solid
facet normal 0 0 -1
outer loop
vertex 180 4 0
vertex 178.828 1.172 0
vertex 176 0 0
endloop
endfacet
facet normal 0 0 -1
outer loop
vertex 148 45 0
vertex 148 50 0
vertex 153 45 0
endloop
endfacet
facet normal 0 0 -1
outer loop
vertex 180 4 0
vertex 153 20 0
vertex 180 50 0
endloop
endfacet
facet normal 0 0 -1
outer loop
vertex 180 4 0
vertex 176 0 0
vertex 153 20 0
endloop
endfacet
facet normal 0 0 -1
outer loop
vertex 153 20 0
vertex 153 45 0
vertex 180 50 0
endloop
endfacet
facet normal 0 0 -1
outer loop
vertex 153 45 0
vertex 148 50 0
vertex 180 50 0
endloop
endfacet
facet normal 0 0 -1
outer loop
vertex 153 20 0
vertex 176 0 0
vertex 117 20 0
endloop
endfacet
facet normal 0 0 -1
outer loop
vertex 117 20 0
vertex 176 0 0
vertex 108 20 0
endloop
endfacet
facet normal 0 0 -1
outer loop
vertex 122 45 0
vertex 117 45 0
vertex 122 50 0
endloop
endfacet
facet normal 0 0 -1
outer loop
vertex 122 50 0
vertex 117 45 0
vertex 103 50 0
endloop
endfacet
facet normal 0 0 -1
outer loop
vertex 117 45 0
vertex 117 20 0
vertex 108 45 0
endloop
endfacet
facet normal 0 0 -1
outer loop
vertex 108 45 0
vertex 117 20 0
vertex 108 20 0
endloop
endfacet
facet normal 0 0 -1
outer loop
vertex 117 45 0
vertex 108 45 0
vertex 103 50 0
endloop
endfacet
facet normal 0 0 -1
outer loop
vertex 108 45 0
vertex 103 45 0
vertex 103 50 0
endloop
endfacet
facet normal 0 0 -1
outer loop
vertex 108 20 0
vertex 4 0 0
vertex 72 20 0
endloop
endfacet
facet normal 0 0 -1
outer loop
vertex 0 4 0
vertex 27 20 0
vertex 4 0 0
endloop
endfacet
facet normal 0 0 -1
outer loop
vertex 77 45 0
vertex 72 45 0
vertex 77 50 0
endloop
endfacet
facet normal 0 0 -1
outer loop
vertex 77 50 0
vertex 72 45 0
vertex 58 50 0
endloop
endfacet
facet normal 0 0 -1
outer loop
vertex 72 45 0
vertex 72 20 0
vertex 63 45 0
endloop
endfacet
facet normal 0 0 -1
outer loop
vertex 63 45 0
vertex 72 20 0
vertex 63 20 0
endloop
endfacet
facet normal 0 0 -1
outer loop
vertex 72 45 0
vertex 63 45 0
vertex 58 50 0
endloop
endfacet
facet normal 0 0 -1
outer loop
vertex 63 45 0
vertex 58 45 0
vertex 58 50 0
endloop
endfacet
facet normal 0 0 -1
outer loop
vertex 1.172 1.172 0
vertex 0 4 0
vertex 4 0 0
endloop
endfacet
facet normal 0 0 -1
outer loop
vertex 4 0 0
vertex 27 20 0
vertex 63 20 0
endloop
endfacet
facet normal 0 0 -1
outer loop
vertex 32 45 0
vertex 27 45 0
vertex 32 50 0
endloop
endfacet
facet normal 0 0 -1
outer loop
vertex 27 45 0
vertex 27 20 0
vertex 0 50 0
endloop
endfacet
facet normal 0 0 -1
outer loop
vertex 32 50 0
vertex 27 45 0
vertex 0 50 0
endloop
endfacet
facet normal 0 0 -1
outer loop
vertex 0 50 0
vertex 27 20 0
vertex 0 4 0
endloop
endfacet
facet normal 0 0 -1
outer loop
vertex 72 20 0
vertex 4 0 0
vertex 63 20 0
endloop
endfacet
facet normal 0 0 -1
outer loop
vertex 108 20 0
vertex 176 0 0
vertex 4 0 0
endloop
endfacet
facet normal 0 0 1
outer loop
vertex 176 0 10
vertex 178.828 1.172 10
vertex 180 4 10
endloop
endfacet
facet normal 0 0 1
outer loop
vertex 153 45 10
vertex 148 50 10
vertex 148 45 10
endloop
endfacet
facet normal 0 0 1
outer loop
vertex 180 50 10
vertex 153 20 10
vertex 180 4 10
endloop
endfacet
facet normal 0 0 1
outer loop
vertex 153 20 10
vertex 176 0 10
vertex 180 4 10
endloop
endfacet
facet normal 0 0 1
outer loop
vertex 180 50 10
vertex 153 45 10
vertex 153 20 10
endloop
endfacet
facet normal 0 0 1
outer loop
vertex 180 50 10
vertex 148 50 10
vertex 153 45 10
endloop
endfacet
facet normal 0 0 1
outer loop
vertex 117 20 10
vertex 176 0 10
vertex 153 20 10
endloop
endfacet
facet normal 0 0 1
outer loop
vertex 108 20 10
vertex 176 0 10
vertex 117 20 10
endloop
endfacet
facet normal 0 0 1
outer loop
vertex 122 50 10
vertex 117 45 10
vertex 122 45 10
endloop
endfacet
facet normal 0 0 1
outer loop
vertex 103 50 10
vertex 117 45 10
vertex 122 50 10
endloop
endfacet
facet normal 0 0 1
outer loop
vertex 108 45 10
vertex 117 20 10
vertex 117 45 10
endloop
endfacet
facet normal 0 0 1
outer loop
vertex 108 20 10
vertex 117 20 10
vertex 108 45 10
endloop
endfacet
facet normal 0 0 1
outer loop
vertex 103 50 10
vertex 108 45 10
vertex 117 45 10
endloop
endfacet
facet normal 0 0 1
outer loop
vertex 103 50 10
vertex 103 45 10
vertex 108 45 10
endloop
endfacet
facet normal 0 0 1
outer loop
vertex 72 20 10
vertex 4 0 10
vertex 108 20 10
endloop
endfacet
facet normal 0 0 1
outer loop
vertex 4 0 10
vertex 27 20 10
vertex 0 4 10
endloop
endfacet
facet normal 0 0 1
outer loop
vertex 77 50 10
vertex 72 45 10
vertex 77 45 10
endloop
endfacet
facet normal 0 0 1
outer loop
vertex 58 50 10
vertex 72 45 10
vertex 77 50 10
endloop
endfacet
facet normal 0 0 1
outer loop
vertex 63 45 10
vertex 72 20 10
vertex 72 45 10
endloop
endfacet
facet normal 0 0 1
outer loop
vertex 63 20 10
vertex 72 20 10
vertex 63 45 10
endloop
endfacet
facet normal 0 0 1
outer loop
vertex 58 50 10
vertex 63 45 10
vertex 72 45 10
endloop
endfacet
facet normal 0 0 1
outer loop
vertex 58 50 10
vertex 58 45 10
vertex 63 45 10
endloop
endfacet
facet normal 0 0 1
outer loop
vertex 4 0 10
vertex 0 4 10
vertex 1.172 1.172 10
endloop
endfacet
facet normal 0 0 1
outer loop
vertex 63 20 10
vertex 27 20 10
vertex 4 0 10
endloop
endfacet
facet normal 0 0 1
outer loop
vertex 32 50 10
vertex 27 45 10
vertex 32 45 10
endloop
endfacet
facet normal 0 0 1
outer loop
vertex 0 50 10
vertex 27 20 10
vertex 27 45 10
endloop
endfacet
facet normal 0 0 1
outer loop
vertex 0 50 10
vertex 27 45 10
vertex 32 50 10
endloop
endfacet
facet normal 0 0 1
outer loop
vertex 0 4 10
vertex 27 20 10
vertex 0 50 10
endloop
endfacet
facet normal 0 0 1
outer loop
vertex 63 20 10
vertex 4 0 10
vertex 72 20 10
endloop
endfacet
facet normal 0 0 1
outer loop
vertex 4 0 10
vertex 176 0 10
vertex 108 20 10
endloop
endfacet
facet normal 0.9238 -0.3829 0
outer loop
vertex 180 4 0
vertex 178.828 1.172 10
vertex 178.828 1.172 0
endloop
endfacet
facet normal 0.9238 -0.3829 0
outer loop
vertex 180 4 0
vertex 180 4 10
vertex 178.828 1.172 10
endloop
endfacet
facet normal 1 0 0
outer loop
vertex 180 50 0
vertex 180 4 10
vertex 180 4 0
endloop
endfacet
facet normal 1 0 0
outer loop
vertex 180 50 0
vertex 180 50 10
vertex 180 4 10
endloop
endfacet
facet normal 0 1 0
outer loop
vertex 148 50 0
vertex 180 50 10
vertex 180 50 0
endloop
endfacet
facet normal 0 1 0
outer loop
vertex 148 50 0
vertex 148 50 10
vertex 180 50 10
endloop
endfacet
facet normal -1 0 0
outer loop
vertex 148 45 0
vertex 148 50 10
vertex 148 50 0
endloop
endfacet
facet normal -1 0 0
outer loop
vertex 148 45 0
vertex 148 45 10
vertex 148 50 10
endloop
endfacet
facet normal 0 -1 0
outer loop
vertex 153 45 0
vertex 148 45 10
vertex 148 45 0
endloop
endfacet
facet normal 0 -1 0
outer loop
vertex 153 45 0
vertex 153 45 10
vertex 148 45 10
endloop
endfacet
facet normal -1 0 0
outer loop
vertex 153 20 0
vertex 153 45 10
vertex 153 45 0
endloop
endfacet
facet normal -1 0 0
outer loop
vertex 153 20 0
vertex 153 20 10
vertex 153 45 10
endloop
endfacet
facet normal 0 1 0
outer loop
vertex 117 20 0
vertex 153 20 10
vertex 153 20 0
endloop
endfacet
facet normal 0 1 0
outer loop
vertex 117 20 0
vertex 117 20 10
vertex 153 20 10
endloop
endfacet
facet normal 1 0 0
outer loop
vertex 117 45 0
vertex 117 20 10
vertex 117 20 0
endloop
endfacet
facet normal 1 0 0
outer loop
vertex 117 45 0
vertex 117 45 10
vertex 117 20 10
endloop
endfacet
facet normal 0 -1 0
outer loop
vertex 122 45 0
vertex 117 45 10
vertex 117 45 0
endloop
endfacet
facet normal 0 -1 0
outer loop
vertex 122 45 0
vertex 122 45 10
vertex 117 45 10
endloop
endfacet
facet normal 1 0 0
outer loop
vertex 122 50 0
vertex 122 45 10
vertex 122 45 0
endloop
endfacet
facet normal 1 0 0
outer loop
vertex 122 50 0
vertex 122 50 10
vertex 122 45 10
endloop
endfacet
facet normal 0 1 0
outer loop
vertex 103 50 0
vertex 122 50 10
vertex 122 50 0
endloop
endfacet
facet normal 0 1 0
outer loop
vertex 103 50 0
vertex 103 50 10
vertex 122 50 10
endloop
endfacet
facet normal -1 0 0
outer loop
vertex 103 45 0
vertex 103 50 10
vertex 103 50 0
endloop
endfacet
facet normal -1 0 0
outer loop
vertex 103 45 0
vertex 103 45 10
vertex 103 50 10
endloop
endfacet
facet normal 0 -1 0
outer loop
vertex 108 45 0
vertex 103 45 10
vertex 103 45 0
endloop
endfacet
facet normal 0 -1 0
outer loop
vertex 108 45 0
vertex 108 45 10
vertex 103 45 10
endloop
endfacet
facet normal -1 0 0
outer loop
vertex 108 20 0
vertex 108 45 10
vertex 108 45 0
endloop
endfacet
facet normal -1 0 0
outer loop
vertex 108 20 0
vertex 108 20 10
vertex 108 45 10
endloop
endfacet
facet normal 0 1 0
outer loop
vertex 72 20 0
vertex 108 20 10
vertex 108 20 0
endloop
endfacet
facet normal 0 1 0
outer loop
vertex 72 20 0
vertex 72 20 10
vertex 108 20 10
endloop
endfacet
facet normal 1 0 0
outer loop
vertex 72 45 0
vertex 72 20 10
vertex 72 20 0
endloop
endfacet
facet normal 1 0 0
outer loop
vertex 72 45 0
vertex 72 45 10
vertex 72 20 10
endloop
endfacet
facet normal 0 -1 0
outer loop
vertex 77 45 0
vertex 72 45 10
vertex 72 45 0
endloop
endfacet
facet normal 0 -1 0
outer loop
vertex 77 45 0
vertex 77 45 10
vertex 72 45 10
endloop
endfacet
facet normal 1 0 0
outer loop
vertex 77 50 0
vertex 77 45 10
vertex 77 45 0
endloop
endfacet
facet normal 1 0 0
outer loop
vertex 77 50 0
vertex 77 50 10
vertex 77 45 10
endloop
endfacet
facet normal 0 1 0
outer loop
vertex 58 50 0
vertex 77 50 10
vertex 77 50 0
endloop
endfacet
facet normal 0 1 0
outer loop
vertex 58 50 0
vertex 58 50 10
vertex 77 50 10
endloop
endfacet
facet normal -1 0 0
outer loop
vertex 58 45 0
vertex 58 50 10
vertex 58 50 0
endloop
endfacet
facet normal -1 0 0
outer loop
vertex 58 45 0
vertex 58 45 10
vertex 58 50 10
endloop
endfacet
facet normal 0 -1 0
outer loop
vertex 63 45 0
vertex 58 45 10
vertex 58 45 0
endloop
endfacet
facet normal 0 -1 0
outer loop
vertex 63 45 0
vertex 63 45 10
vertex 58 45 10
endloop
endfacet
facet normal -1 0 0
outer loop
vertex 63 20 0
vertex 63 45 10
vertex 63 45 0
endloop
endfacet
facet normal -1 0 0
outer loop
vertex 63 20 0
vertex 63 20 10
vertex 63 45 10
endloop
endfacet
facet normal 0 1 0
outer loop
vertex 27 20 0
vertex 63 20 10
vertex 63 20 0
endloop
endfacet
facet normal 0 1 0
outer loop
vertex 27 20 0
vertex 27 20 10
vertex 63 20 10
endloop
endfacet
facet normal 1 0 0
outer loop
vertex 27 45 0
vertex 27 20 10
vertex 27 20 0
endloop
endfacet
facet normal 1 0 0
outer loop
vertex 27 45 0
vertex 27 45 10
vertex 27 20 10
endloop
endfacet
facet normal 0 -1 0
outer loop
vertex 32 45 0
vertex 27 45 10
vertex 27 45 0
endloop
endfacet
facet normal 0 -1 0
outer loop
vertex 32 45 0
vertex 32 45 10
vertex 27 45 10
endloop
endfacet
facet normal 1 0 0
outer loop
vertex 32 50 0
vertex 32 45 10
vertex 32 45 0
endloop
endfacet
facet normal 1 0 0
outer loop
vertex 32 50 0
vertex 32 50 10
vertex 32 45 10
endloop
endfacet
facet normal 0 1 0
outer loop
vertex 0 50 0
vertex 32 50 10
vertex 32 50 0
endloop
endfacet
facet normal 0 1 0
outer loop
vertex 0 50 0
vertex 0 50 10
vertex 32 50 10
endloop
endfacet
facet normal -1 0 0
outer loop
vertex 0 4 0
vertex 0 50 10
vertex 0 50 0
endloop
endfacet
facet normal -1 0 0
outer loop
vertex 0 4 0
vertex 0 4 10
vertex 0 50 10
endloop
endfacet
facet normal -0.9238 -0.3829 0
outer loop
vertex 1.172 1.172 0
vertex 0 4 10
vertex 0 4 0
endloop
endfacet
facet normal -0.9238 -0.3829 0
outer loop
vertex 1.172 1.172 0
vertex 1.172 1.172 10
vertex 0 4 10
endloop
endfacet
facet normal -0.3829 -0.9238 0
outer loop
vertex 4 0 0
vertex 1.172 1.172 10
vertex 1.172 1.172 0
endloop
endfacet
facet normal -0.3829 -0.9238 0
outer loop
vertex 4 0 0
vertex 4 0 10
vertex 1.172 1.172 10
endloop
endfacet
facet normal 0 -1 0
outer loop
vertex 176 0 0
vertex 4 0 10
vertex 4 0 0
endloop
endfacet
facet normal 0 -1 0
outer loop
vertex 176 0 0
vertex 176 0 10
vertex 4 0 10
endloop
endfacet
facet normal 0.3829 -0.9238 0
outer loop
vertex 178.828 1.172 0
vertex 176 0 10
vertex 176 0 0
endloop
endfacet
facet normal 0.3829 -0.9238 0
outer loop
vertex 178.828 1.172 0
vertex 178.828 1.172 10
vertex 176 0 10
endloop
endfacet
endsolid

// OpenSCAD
$fn = 32;

// ----------------------------------------------------------------------
// Oversize slot bar: 180 mm bar with 3 oversize windows
// ----------------------------------------------------------------------

// --- parameters (mm) ---
profile_height = 10;      // extrusion height
profile_points = 32;      // points of the closed outline

profile = [[0, 4], [1.172, 1.172], [4, 0], [176, 0], [178.828, 1.172], [180, 4], [180, 50], [148, 50], [148, 45], [153, 45], [153, 20], [117, 20], [117, 45], [122, 45], [122, 50], [103, 50], [103, 45], [108, 45], [108, 20], [72, 20], [72, 45], [77, 45], [77, 50], [58, 50], [58, 45], [63, 45], [63, 20], [27, 20], [27, 45], [32, 45], [32, 50], [0, 50]];  // single closed polygon, 32 points, counter clockwise

// --- the one profile operation ---
linear_extrude(height = profile_height) polygon(points = profile);
